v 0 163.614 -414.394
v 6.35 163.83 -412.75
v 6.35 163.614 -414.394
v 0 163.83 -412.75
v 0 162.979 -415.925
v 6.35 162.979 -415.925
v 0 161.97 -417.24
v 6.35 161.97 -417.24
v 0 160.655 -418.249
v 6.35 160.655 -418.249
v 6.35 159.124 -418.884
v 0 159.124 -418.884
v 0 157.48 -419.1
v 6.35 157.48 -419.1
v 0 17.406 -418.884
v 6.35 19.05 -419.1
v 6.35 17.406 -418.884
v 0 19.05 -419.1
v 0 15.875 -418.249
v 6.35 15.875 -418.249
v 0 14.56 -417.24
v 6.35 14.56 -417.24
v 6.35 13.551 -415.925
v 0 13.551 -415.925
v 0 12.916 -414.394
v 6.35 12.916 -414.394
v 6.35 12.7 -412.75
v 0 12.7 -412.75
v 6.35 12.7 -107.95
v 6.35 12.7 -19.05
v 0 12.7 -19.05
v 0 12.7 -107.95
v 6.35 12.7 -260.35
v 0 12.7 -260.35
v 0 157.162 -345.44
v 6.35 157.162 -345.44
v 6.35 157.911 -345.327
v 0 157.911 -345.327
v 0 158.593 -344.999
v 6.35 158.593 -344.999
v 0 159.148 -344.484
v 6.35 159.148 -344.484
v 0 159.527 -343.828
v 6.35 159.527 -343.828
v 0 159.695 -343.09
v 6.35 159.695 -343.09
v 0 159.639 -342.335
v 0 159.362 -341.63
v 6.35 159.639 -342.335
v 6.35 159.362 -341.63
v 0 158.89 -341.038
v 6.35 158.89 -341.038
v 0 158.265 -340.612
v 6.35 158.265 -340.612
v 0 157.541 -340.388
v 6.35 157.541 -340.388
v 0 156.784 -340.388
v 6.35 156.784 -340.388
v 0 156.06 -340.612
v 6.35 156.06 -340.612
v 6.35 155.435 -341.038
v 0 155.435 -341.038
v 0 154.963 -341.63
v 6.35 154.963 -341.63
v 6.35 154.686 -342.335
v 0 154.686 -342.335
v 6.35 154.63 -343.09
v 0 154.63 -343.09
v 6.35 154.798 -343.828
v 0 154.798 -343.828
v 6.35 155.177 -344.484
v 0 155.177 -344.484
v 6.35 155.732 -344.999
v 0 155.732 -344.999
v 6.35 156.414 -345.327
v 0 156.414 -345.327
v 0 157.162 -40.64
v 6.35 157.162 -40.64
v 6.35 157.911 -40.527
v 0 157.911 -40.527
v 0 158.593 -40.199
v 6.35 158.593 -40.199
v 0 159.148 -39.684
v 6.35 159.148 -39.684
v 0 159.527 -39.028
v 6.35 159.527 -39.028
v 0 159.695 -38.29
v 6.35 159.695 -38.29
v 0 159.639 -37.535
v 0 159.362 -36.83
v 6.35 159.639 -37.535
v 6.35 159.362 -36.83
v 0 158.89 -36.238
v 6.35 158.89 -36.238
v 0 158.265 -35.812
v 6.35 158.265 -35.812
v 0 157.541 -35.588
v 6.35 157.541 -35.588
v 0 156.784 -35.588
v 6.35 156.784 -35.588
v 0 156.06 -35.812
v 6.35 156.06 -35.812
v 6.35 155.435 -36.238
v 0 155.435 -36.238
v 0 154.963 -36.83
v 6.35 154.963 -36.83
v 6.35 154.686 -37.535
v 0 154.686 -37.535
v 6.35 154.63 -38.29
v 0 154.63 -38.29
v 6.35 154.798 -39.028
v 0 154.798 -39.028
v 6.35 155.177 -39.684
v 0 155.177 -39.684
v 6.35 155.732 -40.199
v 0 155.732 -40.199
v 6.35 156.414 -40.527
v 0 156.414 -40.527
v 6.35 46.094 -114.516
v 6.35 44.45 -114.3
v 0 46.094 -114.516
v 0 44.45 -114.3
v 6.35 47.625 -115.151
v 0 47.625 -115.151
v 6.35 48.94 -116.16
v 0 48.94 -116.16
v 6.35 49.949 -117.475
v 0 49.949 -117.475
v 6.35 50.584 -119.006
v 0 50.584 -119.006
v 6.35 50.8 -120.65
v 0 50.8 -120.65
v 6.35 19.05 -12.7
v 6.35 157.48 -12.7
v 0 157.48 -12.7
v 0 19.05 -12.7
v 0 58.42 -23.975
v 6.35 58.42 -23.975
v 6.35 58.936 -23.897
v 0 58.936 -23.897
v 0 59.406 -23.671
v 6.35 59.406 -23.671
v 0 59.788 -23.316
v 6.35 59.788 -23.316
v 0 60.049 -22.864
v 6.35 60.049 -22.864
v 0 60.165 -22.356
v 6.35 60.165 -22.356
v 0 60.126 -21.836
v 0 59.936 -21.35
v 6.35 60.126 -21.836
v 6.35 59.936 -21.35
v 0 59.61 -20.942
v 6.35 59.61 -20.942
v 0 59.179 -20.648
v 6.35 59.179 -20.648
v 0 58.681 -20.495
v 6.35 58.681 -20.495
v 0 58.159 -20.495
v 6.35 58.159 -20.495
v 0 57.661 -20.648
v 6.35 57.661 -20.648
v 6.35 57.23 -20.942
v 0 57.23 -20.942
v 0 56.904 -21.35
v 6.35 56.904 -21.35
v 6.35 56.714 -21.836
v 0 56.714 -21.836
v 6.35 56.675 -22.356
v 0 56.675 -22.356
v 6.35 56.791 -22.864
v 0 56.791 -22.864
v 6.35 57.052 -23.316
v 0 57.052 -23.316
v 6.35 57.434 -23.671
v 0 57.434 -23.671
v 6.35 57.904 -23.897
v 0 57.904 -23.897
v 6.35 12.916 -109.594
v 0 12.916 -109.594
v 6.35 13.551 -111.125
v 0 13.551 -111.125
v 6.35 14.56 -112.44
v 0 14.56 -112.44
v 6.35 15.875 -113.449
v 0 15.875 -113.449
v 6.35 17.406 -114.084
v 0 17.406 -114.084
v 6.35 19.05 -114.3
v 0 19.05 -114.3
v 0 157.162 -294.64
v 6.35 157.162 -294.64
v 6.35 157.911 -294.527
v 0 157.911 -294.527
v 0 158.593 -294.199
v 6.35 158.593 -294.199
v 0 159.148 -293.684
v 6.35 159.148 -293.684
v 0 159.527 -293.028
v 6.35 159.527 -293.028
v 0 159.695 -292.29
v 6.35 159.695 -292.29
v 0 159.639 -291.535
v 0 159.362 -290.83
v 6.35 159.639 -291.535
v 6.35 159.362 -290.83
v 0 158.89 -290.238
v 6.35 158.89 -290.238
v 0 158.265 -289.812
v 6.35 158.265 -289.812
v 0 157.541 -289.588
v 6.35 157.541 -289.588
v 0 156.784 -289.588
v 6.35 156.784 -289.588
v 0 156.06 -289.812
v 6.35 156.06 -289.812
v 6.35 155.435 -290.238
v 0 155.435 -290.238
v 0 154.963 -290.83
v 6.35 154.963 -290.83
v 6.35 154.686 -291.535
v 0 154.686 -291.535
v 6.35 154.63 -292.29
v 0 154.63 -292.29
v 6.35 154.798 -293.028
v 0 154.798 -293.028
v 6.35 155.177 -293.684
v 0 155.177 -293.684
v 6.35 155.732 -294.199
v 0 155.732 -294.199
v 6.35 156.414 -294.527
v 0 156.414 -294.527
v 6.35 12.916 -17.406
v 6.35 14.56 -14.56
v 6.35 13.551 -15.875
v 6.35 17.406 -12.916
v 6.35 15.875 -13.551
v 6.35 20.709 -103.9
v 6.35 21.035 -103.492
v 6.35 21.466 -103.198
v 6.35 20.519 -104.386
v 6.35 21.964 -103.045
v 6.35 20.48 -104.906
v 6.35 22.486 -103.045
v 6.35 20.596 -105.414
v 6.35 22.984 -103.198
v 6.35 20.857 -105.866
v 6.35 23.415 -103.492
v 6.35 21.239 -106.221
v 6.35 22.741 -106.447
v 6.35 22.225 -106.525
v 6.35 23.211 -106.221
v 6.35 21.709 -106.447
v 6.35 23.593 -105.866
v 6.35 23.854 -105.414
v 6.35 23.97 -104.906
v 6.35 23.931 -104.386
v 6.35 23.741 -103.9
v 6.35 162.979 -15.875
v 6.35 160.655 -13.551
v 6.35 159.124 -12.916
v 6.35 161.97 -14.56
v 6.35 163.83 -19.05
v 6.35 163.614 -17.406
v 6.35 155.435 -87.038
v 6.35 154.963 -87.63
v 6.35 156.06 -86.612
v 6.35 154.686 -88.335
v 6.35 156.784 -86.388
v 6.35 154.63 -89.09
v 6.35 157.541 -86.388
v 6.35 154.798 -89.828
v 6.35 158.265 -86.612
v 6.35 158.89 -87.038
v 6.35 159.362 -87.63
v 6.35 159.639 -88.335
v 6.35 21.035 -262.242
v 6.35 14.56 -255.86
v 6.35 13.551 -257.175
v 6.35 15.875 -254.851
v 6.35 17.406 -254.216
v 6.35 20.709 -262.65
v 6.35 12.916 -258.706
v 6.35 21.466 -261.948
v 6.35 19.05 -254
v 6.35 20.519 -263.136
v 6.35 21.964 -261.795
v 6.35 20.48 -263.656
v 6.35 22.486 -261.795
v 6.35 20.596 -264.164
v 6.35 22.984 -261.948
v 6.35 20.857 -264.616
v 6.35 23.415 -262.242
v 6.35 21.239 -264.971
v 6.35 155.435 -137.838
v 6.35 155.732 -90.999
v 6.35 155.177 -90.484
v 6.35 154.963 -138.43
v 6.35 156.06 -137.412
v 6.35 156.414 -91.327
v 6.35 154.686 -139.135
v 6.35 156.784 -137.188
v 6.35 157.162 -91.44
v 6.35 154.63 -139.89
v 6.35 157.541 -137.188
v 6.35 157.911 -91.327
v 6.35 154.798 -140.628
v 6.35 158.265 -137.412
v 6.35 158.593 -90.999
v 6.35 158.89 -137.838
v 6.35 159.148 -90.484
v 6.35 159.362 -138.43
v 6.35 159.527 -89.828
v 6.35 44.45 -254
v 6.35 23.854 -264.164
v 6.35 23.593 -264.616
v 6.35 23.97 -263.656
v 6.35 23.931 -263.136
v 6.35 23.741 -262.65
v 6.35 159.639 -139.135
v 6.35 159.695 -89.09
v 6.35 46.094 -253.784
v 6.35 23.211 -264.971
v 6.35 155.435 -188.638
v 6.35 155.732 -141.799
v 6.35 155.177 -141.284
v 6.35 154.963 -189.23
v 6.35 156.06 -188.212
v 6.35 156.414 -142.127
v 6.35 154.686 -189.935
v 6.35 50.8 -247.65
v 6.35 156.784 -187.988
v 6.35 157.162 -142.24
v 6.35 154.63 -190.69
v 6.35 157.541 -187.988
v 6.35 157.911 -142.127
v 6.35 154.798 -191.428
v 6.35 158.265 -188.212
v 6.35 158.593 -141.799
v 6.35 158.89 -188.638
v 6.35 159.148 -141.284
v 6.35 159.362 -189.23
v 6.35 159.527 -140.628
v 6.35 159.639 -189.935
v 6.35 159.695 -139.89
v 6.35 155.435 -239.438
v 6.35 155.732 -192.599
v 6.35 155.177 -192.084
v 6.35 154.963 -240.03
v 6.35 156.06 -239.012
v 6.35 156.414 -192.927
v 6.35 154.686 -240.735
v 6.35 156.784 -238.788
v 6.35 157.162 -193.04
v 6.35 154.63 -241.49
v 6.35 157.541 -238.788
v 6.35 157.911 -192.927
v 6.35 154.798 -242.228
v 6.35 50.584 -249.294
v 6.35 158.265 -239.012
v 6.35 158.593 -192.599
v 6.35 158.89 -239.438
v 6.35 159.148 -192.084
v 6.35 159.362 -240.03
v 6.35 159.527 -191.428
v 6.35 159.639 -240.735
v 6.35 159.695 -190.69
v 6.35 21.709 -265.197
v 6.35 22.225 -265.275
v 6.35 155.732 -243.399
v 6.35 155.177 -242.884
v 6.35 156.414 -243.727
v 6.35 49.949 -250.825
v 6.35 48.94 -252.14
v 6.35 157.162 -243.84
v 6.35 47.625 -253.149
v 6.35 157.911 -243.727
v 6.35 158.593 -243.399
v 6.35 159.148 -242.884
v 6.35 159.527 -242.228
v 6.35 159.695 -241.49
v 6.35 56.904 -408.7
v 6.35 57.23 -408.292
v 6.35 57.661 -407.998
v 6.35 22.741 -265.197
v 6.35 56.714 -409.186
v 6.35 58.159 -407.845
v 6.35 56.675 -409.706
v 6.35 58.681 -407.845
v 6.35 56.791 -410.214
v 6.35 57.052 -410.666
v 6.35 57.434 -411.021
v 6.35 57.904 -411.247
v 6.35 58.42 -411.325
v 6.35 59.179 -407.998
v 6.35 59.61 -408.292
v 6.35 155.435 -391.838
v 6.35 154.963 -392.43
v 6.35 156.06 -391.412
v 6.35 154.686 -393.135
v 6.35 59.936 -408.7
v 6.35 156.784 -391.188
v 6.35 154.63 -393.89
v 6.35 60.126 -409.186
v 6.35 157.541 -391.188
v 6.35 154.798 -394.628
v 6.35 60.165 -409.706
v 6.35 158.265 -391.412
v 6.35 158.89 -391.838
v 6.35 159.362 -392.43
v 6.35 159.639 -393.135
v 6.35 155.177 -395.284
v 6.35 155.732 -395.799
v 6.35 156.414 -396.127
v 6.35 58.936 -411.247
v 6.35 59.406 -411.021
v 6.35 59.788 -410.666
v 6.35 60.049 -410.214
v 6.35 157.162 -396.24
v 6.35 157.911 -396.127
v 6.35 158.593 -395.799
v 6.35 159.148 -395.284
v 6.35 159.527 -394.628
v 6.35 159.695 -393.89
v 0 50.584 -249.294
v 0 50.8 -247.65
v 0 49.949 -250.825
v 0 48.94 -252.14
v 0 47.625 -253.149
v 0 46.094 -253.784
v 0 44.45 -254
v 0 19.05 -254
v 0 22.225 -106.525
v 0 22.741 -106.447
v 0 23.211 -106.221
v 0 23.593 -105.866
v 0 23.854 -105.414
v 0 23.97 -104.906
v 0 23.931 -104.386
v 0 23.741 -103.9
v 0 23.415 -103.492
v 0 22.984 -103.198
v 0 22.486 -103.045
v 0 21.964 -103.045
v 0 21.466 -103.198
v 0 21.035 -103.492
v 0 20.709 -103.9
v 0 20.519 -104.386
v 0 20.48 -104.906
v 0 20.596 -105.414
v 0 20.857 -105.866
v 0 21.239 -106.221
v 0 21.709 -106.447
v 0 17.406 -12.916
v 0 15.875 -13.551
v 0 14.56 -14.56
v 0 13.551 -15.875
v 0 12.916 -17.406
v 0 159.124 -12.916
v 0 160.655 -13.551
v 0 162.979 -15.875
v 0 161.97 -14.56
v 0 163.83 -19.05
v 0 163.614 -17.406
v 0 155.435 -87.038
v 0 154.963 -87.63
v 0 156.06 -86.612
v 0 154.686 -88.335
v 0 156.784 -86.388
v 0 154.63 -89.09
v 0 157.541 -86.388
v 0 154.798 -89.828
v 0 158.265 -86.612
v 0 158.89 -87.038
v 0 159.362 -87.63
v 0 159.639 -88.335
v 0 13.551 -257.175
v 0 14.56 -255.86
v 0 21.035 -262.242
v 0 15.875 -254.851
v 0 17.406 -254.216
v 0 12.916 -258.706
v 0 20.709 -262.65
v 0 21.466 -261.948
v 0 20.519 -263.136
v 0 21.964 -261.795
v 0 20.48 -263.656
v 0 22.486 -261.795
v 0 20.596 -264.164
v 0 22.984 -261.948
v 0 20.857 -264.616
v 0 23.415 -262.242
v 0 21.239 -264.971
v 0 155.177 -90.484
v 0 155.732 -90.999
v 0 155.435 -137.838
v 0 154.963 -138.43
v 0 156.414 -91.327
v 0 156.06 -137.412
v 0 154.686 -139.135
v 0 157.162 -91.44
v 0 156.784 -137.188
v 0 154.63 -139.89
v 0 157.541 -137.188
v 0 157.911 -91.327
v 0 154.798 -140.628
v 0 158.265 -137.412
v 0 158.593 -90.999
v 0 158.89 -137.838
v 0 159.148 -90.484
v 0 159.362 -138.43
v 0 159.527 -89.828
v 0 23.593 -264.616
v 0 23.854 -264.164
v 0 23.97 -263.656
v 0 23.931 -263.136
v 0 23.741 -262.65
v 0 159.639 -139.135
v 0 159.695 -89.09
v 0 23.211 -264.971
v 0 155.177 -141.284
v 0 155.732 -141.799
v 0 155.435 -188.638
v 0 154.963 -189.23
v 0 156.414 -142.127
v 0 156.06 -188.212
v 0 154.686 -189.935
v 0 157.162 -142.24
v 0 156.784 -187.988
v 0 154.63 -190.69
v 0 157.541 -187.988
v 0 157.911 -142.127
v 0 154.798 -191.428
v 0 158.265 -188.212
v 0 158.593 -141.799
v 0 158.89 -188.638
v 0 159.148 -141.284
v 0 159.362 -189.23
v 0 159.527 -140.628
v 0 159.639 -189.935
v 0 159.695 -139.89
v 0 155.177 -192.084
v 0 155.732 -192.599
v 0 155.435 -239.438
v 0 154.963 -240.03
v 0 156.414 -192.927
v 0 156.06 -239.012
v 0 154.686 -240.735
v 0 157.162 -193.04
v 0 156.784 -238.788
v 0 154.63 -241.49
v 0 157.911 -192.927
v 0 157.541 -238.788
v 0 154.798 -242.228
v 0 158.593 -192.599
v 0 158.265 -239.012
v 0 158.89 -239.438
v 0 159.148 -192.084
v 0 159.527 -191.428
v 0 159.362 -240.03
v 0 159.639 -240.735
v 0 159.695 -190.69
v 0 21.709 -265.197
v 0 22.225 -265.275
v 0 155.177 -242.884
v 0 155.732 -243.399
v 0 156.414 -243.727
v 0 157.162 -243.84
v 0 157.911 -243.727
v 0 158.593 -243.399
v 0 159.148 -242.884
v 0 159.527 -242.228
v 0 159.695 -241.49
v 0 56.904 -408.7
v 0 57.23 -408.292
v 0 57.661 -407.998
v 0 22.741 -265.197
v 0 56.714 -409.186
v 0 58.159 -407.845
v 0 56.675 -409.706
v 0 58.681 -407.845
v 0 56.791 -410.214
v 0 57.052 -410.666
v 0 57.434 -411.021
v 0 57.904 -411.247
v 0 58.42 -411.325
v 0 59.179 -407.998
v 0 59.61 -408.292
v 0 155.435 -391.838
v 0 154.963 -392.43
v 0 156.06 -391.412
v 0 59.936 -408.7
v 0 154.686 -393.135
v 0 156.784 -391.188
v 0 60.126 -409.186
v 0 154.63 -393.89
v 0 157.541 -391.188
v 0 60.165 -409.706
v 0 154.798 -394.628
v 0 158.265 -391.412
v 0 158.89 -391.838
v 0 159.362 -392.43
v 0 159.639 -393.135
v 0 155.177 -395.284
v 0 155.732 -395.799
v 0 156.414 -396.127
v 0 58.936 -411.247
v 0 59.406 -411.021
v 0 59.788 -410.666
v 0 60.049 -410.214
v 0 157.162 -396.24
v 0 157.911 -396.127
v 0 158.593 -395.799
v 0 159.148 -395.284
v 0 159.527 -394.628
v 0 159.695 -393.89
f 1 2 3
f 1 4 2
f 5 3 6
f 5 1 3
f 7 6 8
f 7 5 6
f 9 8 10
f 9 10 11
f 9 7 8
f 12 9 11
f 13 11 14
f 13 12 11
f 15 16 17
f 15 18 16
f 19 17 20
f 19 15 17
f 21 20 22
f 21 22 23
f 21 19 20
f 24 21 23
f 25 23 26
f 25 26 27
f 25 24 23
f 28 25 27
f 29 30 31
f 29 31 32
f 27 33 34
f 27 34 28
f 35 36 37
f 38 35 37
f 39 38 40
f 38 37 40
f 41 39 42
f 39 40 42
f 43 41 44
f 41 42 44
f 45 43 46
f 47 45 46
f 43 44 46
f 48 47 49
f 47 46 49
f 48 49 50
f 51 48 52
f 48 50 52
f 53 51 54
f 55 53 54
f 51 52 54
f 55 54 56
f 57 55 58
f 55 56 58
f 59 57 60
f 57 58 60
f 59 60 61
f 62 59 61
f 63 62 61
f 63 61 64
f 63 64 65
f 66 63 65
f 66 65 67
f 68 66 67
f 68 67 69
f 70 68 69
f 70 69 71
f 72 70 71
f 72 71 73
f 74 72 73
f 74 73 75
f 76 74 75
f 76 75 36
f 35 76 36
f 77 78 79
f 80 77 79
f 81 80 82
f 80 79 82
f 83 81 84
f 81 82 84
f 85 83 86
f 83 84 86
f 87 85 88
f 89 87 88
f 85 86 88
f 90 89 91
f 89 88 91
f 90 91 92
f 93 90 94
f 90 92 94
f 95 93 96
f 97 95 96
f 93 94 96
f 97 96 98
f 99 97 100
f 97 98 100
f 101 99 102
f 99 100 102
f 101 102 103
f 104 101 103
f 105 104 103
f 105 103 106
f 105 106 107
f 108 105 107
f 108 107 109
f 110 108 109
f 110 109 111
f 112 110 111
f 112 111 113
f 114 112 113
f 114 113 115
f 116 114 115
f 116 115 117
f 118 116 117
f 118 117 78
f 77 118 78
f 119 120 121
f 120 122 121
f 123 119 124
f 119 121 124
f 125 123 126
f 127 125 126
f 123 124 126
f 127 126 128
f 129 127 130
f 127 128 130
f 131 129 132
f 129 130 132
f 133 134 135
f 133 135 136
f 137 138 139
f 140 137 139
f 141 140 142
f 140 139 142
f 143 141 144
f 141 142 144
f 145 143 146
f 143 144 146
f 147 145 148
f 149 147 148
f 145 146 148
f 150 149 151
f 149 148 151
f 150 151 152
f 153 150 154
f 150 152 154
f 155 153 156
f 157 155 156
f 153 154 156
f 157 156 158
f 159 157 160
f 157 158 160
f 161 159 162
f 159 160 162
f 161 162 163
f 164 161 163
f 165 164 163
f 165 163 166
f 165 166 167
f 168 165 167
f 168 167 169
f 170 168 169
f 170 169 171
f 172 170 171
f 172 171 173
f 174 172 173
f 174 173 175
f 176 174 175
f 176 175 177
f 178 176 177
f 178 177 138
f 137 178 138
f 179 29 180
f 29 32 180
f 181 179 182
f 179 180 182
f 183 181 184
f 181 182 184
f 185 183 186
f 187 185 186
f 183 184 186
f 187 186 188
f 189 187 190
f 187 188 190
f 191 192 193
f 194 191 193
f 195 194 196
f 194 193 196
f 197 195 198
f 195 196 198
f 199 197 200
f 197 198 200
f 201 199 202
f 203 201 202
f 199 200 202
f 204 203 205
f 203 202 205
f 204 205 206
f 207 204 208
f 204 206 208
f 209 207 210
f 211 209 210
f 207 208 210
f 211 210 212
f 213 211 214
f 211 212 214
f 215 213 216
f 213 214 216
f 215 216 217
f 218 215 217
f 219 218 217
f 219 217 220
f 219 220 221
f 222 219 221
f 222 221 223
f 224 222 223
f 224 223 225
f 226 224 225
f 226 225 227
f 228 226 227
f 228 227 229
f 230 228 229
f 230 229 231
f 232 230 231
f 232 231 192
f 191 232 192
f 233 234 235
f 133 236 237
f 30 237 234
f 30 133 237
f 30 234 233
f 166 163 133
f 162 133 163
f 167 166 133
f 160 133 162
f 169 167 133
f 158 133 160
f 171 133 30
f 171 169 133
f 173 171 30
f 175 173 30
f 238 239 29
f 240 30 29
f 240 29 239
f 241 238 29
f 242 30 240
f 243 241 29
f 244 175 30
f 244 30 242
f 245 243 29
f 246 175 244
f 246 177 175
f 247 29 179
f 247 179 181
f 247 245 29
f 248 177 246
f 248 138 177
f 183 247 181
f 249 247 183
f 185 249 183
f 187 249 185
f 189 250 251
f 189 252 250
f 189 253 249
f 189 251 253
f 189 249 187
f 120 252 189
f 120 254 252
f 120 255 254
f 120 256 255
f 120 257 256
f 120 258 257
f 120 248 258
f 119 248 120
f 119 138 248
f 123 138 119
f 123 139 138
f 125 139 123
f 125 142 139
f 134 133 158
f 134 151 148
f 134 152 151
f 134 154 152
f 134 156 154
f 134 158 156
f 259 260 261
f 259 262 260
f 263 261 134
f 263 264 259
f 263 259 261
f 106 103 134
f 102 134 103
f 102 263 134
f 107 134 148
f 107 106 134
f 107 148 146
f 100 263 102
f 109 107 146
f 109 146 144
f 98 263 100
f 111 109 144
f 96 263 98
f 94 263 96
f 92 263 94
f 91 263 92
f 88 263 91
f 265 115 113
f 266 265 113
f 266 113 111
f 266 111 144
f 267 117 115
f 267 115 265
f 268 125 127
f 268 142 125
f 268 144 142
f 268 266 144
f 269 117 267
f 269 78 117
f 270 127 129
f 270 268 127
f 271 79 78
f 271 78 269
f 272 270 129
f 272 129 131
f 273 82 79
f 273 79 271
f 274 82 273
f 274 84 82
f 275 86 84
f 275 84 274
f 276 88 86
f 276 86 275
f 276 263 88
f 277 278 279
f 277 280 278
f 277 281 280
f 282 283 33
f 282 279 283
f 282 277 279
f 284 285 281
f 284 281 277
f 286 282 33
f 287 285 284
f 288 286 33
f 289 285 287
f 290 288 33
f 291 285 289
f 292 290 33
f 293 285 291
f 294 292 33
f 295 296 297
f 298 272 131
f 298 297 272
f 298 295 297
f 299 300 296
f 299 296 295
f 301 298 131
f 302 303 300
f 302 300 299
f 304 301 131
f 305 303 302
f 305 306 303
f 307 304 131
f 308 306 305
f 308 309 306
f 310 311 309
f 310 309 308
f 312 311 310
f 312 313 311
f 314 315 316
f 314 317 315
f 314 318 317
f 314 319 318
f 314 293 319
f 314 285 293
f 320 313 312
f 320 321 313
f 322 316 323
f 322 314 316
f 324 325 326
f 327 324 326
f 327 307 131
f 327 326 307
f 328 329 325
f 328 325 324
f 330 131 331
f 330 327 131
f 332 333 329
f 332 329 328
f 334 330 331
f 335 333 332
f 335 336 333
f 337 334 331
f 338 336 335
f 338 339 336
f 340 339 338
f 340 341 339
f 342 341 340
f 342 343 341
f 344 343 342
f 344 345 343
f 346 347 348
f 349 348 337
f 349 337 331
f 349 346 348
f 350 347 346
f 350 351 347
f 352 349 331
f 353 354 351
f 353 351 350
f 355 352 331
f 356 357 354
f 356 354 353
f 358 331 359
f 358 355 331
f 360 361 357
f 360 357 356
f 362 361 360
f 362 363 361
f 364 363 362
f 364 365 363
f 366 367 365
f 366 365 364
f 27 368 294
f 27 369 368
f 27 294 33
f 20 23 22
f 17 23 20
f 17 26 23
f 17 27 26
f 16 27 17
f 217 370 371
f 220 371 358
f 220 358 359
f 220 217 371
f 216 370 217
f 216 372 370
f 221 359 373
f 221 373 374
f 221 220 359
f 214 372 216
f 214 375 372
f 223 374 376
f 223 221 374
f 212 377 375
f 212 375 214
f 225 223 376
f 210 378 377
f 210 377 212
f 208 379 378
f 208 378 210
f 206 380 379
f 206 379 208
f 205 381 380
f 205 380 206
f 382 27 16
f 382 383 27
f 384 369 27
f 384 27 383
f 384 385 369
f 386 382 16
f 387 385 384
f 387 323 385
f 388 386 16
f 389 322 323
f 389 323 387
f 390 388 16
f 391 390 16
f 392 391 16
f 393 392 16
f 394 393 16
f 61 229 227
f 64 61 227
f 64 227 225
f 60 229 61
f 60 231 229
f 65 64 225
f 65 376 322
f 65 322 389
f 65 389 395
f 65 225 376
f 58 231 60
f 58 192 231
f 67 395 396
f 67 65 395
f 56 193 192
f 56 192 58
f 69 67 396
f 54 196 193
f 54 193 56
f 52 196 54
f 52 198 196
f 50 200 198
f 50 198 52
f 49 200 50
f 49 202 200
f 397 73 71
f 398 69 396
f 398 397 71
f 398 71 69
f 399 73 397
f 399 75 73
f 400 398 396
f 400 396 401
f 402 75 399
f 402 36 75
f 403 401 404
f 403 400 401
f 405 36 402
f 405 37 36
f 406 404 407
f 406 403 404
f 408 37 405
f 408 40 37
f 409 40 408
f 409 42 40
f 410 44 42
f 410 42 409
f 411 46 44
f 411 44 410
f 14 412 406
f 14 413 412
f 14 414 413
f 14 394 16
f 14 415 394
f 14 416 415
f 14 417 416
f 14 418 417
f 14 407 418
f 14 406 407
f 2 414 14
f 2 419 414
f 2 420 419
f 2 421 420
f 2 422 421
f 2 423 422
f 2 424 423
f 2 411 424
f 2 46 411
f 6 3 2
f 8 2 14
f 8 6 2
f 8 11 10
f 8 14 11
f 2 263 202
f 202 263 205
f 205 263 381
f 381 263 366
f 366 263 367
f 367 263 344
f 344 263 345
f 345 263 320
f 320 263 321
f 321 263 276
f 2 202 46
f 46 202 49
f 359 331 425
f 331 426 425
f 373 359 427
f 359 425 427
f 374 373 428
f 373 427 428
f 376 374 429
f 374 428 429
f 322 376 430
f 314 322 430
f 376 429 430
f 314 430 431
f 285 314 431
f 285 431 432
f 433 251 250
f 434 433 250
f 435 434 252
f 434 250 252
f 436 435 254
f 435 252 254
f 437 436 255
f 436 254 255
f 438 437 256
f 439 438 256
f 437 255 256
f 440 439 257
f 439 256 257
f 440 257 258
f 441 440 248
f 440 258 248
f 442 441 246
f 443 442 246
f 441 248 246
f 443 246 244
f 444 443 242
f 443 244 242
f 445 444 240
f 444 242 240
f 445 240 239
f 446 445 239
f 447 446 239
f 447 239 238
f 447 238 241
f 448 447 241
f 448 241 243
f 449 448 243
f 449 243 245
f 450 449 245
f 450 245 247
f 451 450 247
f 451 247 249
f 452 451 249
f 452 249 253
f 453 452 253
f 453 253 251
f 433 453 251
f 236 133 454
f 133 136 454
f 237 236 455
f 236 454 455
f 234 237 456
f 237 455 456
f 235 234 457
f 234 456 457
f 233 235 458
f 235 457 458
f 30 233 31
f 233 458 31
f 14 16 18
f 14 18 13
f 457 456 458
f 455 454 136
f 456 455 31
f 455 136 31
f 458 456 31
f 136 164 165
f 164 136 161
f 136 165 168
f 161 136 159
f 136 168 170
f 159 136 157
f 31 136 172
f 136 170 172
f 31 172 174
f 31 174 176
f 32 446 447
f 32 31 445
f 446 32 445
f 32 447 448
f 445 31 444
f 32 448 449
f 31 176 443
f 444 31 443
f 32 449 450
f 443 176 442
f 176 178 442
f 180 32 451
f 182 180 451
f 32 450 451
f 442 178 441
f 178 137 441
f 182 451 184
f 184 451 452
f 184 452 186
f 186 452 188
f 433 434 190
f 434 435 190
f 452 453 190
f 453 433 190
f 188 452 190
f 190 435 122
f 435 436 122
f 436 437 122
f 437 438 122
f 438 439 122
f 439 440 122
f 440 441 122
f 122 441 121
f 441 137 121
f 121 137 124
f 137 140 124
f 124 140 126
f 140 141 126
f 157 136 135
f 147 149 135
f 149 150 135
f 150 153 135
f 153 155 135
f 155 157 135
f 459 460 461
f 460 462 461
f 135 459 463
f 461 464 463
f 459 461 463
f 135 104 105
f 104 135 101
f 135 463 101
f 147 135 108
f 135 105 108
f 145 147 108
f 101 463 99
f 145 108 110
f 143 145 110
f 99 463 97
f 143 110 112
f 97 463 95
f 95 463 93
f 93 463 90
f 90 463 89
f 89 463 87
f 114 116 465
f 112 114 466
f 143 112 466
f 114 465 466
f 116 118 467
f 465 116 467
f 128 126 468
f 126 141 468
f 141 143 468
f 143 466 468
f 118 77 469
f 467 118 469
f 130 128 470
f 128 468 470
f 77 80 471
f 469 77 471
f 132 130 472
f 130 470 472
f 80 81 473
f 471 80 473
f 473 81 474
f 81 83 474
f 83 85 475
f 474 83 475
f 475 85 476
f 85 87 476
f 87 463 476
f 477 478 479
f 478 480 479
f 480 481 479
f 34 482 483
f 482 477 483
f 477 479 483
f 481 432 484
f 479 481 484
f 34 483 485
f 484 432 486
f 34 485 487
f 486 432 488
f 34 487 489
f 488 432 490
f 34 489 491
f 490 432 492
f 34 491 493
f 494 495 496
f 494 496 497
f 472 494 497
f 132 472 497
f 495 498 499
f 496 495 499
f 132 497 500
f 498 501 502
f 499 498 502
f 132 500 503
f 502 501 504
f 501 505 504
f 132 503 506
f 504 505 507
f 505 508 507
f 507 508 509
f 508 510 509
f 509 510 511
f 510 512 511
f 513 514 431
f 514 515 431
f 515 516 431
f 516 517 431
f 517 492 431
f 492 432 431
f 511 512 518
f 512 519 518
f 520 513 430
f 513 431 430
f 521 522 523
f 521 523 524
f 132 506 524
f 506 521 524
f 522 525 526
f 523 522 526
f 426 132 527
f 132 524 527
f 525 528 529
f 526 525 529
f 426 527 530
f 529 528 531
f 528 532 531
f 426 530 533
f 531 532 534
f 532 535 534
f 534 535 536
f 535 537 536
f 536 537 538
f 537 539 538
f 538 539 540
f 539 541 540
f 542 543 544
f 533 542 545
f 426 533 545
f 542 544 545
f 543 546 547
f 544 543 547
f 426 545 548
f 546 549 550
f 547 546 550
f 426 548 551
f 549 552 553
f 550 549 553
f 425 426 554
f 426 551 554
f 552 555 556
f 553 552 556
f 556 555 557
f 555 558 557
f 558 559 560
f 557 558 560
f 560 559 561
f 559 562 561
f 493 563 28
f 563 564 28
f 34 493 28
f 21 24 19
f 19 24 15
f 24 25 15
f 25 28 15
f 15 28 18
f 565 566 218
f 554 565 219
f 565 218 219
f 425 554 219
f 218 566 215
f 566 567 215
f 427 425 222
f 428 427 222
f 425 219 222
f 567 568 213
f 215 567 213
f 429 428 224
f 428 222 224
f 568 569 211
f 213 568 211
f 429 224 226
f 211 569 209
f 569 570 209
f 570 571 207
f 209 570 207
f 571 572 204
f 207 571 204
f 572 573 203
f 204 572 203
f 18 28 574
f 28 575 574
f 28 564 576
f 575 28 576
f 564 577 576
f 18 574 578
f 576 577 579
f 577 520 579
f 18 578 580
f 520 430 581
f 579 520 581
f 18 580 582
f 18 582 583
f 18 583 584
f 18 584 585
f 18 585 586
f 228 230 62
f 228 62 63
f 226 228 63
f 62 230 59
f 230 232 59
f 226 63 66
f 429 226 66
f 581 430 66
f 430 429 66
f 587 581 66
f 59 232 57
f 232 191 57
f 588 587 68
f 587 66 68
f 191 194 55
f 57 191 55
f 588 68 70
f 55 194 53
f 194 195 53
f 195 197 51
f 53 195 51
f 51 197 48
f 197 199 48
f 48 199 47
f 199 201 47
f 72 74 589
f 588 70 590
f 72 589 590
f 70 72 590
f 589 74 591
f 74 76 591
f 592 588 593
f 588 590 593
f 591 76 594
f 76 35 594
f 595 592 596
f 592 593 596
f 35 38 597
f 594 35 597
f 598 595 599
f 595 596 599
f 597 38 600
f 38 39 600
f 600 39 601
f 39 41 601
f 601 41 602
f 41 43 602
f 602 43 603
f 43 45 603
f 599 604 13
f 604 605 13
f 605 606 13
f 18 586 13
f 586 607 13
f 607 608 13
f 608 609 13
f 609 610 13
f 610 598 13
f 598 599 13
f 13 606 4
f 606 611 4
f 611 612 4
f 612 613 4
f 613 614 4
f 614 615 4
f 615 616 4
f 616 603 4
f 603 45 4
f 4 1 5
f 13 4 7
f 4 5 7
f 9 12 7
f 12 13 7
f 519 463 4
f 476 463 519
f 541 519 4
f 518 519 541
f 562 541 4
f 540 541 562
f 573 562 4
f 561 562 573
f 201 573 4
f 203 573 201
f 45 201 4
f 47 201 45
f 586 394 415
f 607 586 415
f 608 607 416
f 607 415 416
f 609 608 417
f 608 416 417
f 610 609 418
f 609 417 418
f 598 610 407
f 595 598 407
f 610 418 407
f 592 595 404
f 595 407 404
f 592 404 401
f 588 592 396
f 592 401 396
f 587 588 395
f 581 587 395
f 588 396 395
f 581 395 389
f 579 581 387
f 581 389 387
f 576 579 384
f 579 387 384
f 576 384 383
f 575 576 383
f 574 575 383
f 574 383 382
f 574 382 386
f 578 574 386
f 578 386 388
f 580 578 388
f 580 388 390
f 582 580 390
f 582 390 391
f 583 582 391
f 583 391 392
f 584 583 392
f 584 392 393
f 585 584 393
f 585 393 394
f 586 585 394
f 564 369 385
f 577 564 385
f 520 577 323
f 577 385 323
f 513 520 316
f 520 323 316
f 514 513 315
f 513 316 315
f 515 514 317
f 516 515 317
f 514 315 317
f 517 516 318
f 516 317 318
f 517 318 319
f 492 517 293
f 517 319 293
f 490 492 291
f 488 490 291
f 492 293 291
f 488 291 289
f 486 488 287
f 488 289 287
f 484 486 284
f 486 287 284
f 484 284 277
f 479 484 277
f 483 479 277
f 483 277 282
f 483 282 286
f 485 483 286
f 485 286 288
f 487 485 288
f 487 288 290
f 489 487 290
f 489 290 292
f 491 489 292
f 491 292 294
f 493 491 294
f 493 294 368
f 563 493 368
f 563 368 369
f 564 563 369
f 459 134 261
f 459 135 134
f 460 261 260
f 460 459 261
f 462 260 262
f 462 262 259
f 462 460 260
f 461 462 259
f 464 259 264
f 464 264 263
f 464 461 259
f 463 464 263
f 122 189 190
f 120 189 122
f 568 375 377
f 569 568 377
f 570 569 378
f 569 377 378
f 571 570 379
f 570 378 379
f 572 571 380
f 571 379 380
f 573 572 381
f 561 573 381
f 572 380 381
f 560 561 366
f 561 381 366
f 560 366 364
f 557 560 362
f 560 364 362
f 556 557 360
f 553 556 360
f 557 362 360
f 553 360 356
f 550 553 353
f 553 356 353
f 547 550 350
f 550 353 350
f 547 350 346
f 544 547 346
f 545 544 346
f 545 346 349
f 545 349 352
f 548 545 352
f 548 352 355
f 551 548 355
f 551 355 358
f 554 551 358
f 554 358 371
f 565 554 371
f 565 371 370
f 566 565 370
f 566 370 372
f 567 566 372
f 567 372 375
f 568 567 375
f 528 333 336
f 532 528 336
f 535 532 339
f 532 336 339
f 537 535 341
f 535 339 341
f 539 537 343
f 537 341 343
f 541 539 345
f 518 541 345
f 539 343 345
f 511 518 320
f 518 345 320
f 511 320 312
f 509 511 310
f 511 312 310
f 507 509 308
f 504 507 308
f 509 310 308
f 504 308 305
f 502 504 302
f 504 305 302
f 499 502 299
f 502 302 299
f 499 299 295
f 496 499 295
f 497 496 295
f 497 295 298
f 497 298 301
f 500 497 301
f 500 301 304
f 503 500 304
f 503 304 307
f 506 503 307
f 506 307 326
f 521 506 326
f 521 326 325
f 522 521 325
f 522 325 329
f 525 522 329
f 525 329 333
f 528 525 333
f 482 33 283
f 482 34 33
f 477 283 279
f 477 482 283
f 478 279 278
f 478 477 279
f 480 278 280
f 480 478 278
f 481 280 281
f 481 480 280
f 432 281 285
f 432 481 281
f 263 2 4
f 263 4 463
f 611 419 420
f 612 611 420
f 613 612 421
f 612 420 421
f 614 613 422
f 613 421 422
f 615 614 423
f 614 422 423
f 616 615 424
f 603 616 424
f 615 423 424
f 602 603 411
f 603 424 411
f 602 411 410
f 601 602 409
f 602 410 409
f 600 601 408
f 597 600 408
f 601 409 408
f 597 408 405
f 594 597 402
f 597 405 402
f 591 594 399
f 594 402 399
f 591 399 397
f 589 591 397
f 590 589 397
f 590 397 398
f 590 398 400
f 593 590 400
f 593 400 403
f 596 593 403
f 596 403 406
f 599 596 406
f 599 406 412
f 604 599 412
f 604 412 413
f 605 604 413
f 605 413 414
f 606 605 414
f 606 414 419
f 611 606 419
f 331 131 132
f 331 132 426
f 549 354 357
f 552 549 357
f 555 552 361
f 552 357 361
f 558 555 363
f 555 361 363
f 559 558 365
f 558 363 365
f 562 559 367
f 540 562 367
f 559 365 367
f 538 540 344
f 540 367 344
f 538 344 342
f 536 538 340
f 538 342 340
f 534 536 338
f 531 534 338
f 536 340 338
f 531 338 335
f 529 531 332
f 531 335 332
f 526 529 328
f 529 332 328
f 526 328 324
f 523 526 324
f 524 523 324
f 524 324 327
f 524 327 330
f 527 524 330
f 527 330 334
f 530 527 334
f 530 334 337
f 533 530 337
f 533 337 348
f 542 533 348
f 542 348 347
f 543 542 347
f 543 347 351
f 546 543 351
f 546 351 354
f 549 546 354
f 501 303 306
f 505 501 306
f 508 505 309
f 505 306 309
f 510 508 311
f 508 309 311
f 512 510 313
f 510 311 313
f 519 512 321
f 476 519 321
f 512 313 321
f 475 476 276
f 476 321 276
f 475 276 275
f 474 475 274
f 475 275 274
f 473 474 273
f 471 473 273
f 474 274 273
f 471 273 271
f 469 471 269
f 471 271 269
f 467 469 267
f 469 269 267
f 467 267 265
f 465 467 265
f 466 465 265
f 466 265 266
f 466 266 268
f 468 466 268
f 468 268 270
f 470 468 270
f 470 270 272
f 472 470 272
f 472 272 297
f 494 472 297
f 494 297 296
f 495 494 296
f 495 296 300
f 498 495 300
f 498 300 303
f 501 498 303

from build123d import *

# Parameters (mm, degrees)
BOSS_EXTRUDE1_DEPTH = 6.35
SKETCH3_R           = 3.96875
CUT_EXTRUDE1_DEPTH  = 7.35
SKETCH5_W           = 6.35
SKETCH5_H           = 12.7
CUT_EXTRUDE3_DEPTH  = 7.35
LPATTERN1_COUNT     = 16
LPATTERN1_PITCH     = 25.4
SKETCH6_W           = 6.35
SKETCH6_H           = 12.7
CUT_EXTRUDE4_DEPTH  = 7.35
LPATTERN2_COUNT     = 11
LPATTERN2_PITCH     = 25.4
SKETCH7_W           = 6.35
SKETCH7_H           = 12.7
SKETCH7_W_2         = 12.7
SKETCH7_H_2         = 6.35
CUT_EXTRUDE5_DEPTH  = 7.35
CUT_EXTRUDE6_DEPTH  = 7.35
LPATTERN3_COUNT     = 10
LPATTERN3_PITCH     = 25.4
SKETCH9_W           = 12.7
SKETCH9_H           = 6.35
CUT_EXTRUDE7_DEPTH  = 7.35
LPATTERN4_COUNT     = 8
LPATTERN4_PITCH     = 25.4
SKETCH10_R          = 3.175
CUT_EXTRUDE8_DEPTH  = 7.35
SKETCH11_R          = 3.96875
CUT_EXTRUDE9_DEPTH  = 7.35
SKETCH12_W          = 6.35
SKETCH12_H          = 12.7
CUT_EXTRUDE13_DEPTH = 7.35
CUT_EXTRUDE15_DEPTH = 7.35
CUT_EXTRUDE16_DEPTH = 7.35
SKETCH17_W          = 12.7
SKETCH17_H          = 6.35
CUT_EXTRUDE17_DEPTH = 7.35
LPATTERN5_COUNT     = 17
LPATTERN5_PITCH     = 25.4
LPATTERN6_COUNT     = 2
LPATTERN6_PITCH     = 120.65
SKETCH18_W          = 12.7
SKETCH18_H          = 6.35
CUT_EXTRUDE18_DEPTH = 7.35
LPATTERN7_COUNT     = 5
LPATTERN7_PITCH     = 25.4
CUT_EXTRUDE19_DEPTH = 7.35
SKETCH20_W          = 101.6
SKETCH20_H          = 57.15
CUT_EXTRUDE20_DEPTH = 7.35
CUT_EXTRUDE21_DEPTH = 7.35
CUT_EXTRUDE22_DEPTH = 7.35
BOSS_EXTRUDE4_DEPTH = 6.35
BOSS_EXTRUDE5_DEPTH = 6.35
SKETCH29_R          = 2.54
CUT_EXTRUDE23_DEPTH = 7.35
SKETCH30_R          = 1.75
CUT_EXTRUDE24_DEPTH = 7.35
FILLET2_R           = 6.35


with BuildPart() as part:
    # Sketch2 → Boss-Extrude1 (new body)
    with BuildSketch(Plane(origin=(0, 0, 0), x_dir=(0, 0, -1), z_dir=(1, 0, 0))):
        Polygon((0, 0), (0, 294.450076882), (215.9, 419.1), (431.8, 419.1), (431.8, 0), (241.3, 0), (241.3, 38.1), (127, 38.1), (127, 0), align=None)
    extrude(amount=BOSS_EXTRUDE1_DEPTH)

    # Sketch3 → Cut-Extrude1 (cut, through all)
    with BuildSketch(Plane(origin=(6.35, 0, 0), x_dir=(0, 0, -1), z_dir=(1, 0, 0))):
        with Locations((63.5, 38.1)):
            Circle(SKETCH3_R)
        with Locations((368.3, 38.1)):
            Circle(SKETCH3_R)
    extrude(amount=-CUT_EXTRUDE1_DEPTH, mode=Mode.SUBTRACT)

    # Sketch5 → Cut-Extrude3 (cut, through all)
    with BuildSketch(Plane(origin=(6.35, 0, 0), x_dir=(0, 0, -1), z_dir=(1, 0, 0))):
        with Locations((428.625, 19.05)):
            Rectangle(SKETCH5_W, SKETCH5_H)
    cut_extrude3 = extrude(amount=-CUT_EXTRUDE3_DEPTH, mode=Mode.SUBTRACT)

    # LPattern1: Cut-Extrude3 ×16
    with Locations(*[(0, i * LPATTERN1_PITCH, 0) for i in range(1, LPATTERN1_COUNT)]):
        add(cut_extrude3, mode=Mode.SUBTRACT)

    # Sketch6 → Cut-Extrude4 (cut, through all)
    with BuildSketch(Plane(origin=(6.35, 0, 0), x_dir=(0, 0, -1), z_dir=(1, 0, 0))):
        with Locations((3.175, 19.05)):
            Rectangle(SKETCH6_W, SKETCH6_H)
    cut_extrude4 = extrude(amount=-CUT_EXTRUDE4_DEPTH, mode=Mode.SUBTRACT)

    # LPattern2: Cut-Extrude4 ×11
    with Locations(*[(0, i * LPATTERN2_PITCH, 0) for i in range(1, LPATTERN2_COUNT)]):
        add(cut_extrude4, mode=Mode.SUBTRACT)

    # Sketch7 → Cut-Extrude5 (cut, through all)
    with BuildSketch(Plane(origin=(6.35, 0, 0), x_dir=(0, 0, -1), z_dir=(1, 0, 0))):
        with Locations((123.825, 19.05)):
            Rectangle(SKETCH7_W, SKETCH7_H)
        with Locations((133.35, 41.275)):
            Rectangle(SKETCH7_W_2, SKETCH7_H_2)
        with Locations((158.75, 41.275)):
            Rectangle(SKETCH7_W_2, SKETCH7_H_2)
        with Locations((184.15, 41.275)):
            Rectangle(SKETCH7_W_2, SKETCH7_H_2)
        with Locations((244.475, 19.05)):
            Rectangle(SKETCH7_W, SKETCH7_H)
        with Locations((209.55, 41.275)):
            Rectangle(SKETCH7_W_2, SKETCH7_H_2)
        with Locations((234.95, 41.275)):
            Rectangle(SKETCH7_W_2, SKETCH7_H_2)
    extrude(amount=-CUT_EXTRUDE5_DEPTH, mode=Mode.SUBTRACT)

    # Sketch8 → Cut-Extrude6 (cut, through all)
    with BuildSketch(Plane(origin=(6.35, 0, 0), x_dir=(0, 0, -1), z_dir=(1, 0, 0))):
        Polygon((201.93507044, 411.037344159), (212.933593068, 417.387344159), (216.108593068, 411.888082845), (205.11007044, 405.538082845), align=None)
    cut_extrude6 = extrude(amount=-CUT_EXTRUDE6_DEPTH, mode=Mode.SUBTRACT)

    # LPattern3: Cut-Extrude6 ×10
    with Locations(*[Vector(0, -0.5, 0.866025404) * (i * LPATTERN3_PITCH) for i in range(1, LPATTERN3_COUNT)]):
        add(cut_extrude6, mode=Mode.SUBTRACT)

    # Sketch9 → Cut-Extrude7 (cut, through all)
    with BuildSketch(Plane(origin=(6.35, 0, 0), x_dir=(0, 0, -1), z_dir=(1, 0, 0))):
        with Locations((412.75, 415.925)):
            Rectangle(SKETCH9_W, SKETCH9_H)
    cut_extrude7 = extrude(amount=-CUT_EXTRUDE7_DEPTH, mode=Mode.SUBTRACT)

    # LPattern4: Cut-Extrude7 ×8
    with Locations(*[(0, 0, i * LPATTERN4_PITCH) for i in range(1, LPATTERN4_COUNT)]):
        add(cut_extrude7, mode=Mode.SUBTRACT)

    # Sketch10 → Cut-Extrude8 (cut, through all)
    with BuildSketch(Plane(origin=(6.35, 0, 0), x_dir=(0, 0, -1), z_dir=(1, 0, 0))):
        with Locations((222.25, 273.05)):
            Circle(SKETCH10_R)
        with Locations((222.25, 57.15)):
            Circle(SKETCH10_R)
        with Locations((146.05, 57.15)):
            Circle(SKETCH10_R)
        with Locations((146.05, 273.05)):
            Circle(SKETCH10_R)
    extrude(amount=-CUT_EXTRUDE8_DEPTH, mode=Mode.SUBTRACT)

    # Sketch11 → Cut-Extrude9 (cut, through all)
    with BuildSketch(Plane(origin=(6.35, 0, 0), x_dir=(0, 0, -1), z_dir=(1, 0, 0))):
        with Locations((38.1, 260.35)):
            Circle(SKETCH11_R)
        with Locations((266.7, 260.35)):
            Circle(SKETCH11_R)
    extrude(amount=-CUT_EXTRUDE9_DEPTH, mode=Mode.SUBTRACT)

    # Sketch12 → Cut-Extrude13 (cut, through all)
    with BuildSketch(Plane(origin=(6.35, 0, 0), x_dir=(0, 0, -1), z_dir=(1, 0, 0))):
        with Locations((123.825, 44.45)):
            Rectangle(SKETCH12_W, SKETCH12_H)
        with Locations((123.825, 69.85)):
            Rectangle(SKETCH12_W, SKETCH12_H)
        with Locations((123.825, 95.25)):
            Rectangle(SKETCH12_W, SKETCH12_H)
        with Locations((123.825, 120.65)):
            Rectangle(SKETCH12_W, SKETCH12_H)
    cut_extrude13 = extrude(amount=-CUT_EXTRUDE13_DEPTH, mode=Mode.SUBTRACT)

    # Sketch14 → Cut-Extrude15 (cut, through all)
    with BuildSketch(Plane(origin=(6.35, 0, 0), x_dir=(0, 0, -1), z_dir=(1, 0, 0))):
        Polygon((36.957231019, 315.787344159), (47.955753647, 322.137344159), (51.130753647, 316.638082845), (40.132231019, 310.288082845), align=None)
        Polygon((80.951321531, 341.187344159), (91.949844159, 347.537344159), (95.124844159, 342.038082845), (84.126321531, 335.688082845), align=None)
    extrude(amount=-CUT_EXTRUDE15_DEPTH, mode=Mode.SUBTRACT)

    # Sketch15 → Cut-Extrude16 (cut, through all)
    with BuildSketch(Plane(origin=(6.35, 0, 0), x_dir=(0, 0, -1), z_dir=(1, 0, 0))):
        with BuildLine():
            Line((62.129276275, 322.988082845), (31.558579521, 305.338082845))
            ThreePointArc((31.558579521, 305.338082845), (51.535904978, 302.314952438), (62.501260575, 319.285333297))
            ThreePointArc((62.501260575, 319.285333297), (62.408031035, 321.146027155), (62.129276275, 322.988082845))
        make_face()
        with BuildLine():
            Line((103.698495657, 346.988082845), (73.127798903, 329.338082845))
            ThreePointArc((73.127798903, 329.338082845), (93.10512436, 326.314952438), (104.070479957, 343.285333297))
            ThreePointArc((104.070479957, 343.285333297), (103.977250417, 345.146027155), (103.698495657, 346.988082845))
        make_face()
    extrude(amount=-CUT_EXTRUDE16_DEPTH, mode=Mode.SUBTRACT)

    # Sketch17 → Cut-Extrude17 (cut, through all)
    with BuildSketch(Plane(origin=(6.35, 0, 0), x_dir=(0, 0, -1), z_dir=(1, 0, 0))):
        with Locations((25.4, 142.875)):
            Rectangle(SKETCH17_W, SKETCH17_H)
    cut_extrude17 = extrude(amount=-CUT_EXTRUDE17_DEPTH, mode=Mode.SUBTRACT)

    # LPattern5: Cut-Extrude17 ×17
    with Locations(*[(0, 0, -i * LPATTERN5_PITCH) for i in range(1, LPATTERN5_COUNT)]):
        add(cut_extrude17, mode=Mode.SUBTRACT)

    # LPattern6: Cut-Extrude13 ×2
    with Locations(*[(0, 0, -i * LPATTERN6_PITCH) for i in range(1, LPATTERN6_COUNT)]):
        add(cut_extrude13, mode=Mode.SUBTRACT)

    # Sketch18 → Cut-Extrude18 (cut, through all)
    with BuildSketch(Plane(origin=(6.35, 0, 0), x_dir=(0, 0, -1), z_dir=(1, 0, 0))):
        with Locations((133.35, 117.475)):
            Rectangle(SKETCH18_W, SKETCH18_H)
    cut_extrude18 = extrude(amount=-CUT_EXTRUDE18_DEPTH, mode=Mode.SUBTRACT)

    # LPattern7: Cut-Extrude18 ×5
    with Locations(*[(0, 0, -i * LPATTERN7_PITCH) for i in range(1, LPATTERN7_COUNT)]):
        add(cut_extrude18, mode=Mode.SUBTRACT)

    # Sketch19 → Cut-Extrude19 (cut, through all)
    with BuildSketch(Plane(origin=(6.35, 0, 0), x_dir=(0, 0, -1), z_dir=(1, 0, 0))):
        Polygon((25.4, 279.785380045), (222.705909488, 393.7), (406.4, 393.7), (406.4, 165.1), (25.4, 165.1), align=None)
    extrude(amount=-CUT_EXTRUDE19_DEPTH, mode=Mode.SUBTRACT)

    # Sketch20 → Cut-Extrude20 (cut, through all)
    with BuildSketch(Plane(origin=(6.35, 0, 0), x_dir=(0, 0, -1), z_dir=(1, 0, 0))):
        with Locations((184.15, 79.375)):
            Rectangle(SKETCH20_W, SKETCH20_H)
    extrude(amount=-CUT_EXTRUDE20_DEPTH, mode=Mode.SUBTRACT)

    # Sketch21 → Cut-Extrude21 (cut, through all)
    with BuildSketch(Plane(origin=(6.35, 0, 0), x_dir=(0, 0, -1), z_dir=(1, 0, 0))):
        Polygon((266.7, 25.4), (308.202954744, 25.4), (406.4, 82.094090512), (406.4, 133.35), (266.7, 133.35), align=None)
        Polygon((25.4, 133.35), (25.4, 82.094090512), (101.6, 38.1), (101.6, 133.35), align=None)
        Polygon((25.4, 38.1), (25.4, 25.4), (47.397045256, 25.4), align=None)
    extrude(amount=-CUT_EXTRUDE21_DEPTH, mode=Mode.SUBTRACT)

    # Sketch22 → Cut-Extrude22 (cut, through all)
    with BuildSketch(Plane(origin=(6.35, 0, 0), x_dir=(0, 0, -1), z_dir=(1, 0, 0))):
        Polygon((384.402954744, 25.4), (406.4, 38.1), (406.4, 25.4), align=None)
    extrude(amount=-CUT_EXTRUDE22_DEPTH, mode=Mode.SUBTRACT)

    # Sketch26 → Boss-Extrude4 (add, through all)
    with BuildSketch(Plane(origin=(6.35, 0, 0), x_dir=(0, 0, -1), z_dir=(1, 0, 0))):
        Polygon((266.7, 133.35), (266.7, 126.280871047), (278.944090512, 133.35), align=None)
        Polygon((89.355909488, 133.35), (101.6, 126.280871047), (101.6, 133.35), align=None)
        Polygon((266.7, 32.469128953), (278.944090512, 25.4), (266.7, 25.4), align=None)
        Polygon((133.35, 107.95), (133.35, 100.880871047), (145.594090512, 107.95), align=None)
        Polygon((234.95, 107.95), (222.705909488, 107.95), (234.95, 100.880871047), align=None)
        Polygon((133.35, 50.8), (145.594090512, 50.8), (133.35, 57.869128953), align=None)
        Polygon((234.95, 50.8), (222.705909488, 50.8), (234.95, 57.869128953), align=None)
    extrude(amount=-BOSS_EXTRUDE4_DEPTH)


with BuildPart() as body_2:
    # Sketch27 → Boss-Extrude5 (new body)
    with BuildSketch(Plane(origin=(6.35, 0, 0), x_dir=(0, 0, -1), z_dir=(1, 0, 0))):
        Polygon((12.7, 163.83), (12.7, 12.7), (114.3, 12.7), (114.3, 50.8), (254, 50.8), (254, 12.7), (419.1, 12.7), (419.1, 163.83), align=None)
    extrude(amount=-BOSS_EXTRUDE5_DEPTH)

    # Sketch29 → Cut-Extrude23 (cut, through all)
    with BuildSketch(Plane(origin=(6.35, 0, 0), x_dir=(0, 0, -1), z_dir=(1, 0, 0))):
        with Locations((38.1, 157.1625)):
            Circle(SKETCH29_R)
        with Locations((88.9, 157.1625)):
            Circle(SKETCH29_R)
        with Locations((139.7, 157.1625)):
            Circle(SKETCH29_R)
        with Locations((190.5, 157.1625)):
            Circle(SKETCH29_R)
        with Locations((241.3, 157.1625)):
            Circle(SKETCH29_R)
        with Locations((292.1, 157.1625)):
            Circle(SKETCH29_R)
        with Locations((342.9, 157.1625)):
            Circle(SKETCH29_R)
        with Locations((393.7, 157.1625)):
            Circle(SKETCH29_R)
    extrude(amount=-CUT_EXTRUDE23_DEPTH, mode=Mode.SUBTRACT)

    # Sketch30 → Cut-Extrude24 (cut, through all)
    with BuildSketch(Plane(origin=(6.35, 0, 0), x_dir=(0, 0, -1), z_dir=(1, 0, 0))):
        with Locations((22.225, 58.42)):
            Circle(SKETCH30_R)
        with Locations((104.775, 22.225)):
            Circle(SKETCH30_R)
        with Locations((263.525, 22.225)):
            Circle(SKETCH30_R)
        with Locations((409.575, 58.42)):
            Circle(SKETCH30_R)
    extrude(amount=-CUT_EXTRUDE24_DEPTH, mode=Mode.SUBTRACT)

    # Fillet2
    fillet2_edges = [body_2.edges().sort_by_distance(p)[0] for p in [
        (3.175, 163.83, -419.1),
        (3.175, 12.7, -419.1),
        (3.175, 12.7, -254),
        (3.175, 50.8, -254),
        (3.175, 50.8, -114.3),
        (3.175, 12.7, -114.3),
        (3.175, 12.7, -12.7),
        (3.175, 163.83, -12.7),
    ]]
    fillet(fillet2_edges, radius=FILLET2_R)


solid = body_2.part
